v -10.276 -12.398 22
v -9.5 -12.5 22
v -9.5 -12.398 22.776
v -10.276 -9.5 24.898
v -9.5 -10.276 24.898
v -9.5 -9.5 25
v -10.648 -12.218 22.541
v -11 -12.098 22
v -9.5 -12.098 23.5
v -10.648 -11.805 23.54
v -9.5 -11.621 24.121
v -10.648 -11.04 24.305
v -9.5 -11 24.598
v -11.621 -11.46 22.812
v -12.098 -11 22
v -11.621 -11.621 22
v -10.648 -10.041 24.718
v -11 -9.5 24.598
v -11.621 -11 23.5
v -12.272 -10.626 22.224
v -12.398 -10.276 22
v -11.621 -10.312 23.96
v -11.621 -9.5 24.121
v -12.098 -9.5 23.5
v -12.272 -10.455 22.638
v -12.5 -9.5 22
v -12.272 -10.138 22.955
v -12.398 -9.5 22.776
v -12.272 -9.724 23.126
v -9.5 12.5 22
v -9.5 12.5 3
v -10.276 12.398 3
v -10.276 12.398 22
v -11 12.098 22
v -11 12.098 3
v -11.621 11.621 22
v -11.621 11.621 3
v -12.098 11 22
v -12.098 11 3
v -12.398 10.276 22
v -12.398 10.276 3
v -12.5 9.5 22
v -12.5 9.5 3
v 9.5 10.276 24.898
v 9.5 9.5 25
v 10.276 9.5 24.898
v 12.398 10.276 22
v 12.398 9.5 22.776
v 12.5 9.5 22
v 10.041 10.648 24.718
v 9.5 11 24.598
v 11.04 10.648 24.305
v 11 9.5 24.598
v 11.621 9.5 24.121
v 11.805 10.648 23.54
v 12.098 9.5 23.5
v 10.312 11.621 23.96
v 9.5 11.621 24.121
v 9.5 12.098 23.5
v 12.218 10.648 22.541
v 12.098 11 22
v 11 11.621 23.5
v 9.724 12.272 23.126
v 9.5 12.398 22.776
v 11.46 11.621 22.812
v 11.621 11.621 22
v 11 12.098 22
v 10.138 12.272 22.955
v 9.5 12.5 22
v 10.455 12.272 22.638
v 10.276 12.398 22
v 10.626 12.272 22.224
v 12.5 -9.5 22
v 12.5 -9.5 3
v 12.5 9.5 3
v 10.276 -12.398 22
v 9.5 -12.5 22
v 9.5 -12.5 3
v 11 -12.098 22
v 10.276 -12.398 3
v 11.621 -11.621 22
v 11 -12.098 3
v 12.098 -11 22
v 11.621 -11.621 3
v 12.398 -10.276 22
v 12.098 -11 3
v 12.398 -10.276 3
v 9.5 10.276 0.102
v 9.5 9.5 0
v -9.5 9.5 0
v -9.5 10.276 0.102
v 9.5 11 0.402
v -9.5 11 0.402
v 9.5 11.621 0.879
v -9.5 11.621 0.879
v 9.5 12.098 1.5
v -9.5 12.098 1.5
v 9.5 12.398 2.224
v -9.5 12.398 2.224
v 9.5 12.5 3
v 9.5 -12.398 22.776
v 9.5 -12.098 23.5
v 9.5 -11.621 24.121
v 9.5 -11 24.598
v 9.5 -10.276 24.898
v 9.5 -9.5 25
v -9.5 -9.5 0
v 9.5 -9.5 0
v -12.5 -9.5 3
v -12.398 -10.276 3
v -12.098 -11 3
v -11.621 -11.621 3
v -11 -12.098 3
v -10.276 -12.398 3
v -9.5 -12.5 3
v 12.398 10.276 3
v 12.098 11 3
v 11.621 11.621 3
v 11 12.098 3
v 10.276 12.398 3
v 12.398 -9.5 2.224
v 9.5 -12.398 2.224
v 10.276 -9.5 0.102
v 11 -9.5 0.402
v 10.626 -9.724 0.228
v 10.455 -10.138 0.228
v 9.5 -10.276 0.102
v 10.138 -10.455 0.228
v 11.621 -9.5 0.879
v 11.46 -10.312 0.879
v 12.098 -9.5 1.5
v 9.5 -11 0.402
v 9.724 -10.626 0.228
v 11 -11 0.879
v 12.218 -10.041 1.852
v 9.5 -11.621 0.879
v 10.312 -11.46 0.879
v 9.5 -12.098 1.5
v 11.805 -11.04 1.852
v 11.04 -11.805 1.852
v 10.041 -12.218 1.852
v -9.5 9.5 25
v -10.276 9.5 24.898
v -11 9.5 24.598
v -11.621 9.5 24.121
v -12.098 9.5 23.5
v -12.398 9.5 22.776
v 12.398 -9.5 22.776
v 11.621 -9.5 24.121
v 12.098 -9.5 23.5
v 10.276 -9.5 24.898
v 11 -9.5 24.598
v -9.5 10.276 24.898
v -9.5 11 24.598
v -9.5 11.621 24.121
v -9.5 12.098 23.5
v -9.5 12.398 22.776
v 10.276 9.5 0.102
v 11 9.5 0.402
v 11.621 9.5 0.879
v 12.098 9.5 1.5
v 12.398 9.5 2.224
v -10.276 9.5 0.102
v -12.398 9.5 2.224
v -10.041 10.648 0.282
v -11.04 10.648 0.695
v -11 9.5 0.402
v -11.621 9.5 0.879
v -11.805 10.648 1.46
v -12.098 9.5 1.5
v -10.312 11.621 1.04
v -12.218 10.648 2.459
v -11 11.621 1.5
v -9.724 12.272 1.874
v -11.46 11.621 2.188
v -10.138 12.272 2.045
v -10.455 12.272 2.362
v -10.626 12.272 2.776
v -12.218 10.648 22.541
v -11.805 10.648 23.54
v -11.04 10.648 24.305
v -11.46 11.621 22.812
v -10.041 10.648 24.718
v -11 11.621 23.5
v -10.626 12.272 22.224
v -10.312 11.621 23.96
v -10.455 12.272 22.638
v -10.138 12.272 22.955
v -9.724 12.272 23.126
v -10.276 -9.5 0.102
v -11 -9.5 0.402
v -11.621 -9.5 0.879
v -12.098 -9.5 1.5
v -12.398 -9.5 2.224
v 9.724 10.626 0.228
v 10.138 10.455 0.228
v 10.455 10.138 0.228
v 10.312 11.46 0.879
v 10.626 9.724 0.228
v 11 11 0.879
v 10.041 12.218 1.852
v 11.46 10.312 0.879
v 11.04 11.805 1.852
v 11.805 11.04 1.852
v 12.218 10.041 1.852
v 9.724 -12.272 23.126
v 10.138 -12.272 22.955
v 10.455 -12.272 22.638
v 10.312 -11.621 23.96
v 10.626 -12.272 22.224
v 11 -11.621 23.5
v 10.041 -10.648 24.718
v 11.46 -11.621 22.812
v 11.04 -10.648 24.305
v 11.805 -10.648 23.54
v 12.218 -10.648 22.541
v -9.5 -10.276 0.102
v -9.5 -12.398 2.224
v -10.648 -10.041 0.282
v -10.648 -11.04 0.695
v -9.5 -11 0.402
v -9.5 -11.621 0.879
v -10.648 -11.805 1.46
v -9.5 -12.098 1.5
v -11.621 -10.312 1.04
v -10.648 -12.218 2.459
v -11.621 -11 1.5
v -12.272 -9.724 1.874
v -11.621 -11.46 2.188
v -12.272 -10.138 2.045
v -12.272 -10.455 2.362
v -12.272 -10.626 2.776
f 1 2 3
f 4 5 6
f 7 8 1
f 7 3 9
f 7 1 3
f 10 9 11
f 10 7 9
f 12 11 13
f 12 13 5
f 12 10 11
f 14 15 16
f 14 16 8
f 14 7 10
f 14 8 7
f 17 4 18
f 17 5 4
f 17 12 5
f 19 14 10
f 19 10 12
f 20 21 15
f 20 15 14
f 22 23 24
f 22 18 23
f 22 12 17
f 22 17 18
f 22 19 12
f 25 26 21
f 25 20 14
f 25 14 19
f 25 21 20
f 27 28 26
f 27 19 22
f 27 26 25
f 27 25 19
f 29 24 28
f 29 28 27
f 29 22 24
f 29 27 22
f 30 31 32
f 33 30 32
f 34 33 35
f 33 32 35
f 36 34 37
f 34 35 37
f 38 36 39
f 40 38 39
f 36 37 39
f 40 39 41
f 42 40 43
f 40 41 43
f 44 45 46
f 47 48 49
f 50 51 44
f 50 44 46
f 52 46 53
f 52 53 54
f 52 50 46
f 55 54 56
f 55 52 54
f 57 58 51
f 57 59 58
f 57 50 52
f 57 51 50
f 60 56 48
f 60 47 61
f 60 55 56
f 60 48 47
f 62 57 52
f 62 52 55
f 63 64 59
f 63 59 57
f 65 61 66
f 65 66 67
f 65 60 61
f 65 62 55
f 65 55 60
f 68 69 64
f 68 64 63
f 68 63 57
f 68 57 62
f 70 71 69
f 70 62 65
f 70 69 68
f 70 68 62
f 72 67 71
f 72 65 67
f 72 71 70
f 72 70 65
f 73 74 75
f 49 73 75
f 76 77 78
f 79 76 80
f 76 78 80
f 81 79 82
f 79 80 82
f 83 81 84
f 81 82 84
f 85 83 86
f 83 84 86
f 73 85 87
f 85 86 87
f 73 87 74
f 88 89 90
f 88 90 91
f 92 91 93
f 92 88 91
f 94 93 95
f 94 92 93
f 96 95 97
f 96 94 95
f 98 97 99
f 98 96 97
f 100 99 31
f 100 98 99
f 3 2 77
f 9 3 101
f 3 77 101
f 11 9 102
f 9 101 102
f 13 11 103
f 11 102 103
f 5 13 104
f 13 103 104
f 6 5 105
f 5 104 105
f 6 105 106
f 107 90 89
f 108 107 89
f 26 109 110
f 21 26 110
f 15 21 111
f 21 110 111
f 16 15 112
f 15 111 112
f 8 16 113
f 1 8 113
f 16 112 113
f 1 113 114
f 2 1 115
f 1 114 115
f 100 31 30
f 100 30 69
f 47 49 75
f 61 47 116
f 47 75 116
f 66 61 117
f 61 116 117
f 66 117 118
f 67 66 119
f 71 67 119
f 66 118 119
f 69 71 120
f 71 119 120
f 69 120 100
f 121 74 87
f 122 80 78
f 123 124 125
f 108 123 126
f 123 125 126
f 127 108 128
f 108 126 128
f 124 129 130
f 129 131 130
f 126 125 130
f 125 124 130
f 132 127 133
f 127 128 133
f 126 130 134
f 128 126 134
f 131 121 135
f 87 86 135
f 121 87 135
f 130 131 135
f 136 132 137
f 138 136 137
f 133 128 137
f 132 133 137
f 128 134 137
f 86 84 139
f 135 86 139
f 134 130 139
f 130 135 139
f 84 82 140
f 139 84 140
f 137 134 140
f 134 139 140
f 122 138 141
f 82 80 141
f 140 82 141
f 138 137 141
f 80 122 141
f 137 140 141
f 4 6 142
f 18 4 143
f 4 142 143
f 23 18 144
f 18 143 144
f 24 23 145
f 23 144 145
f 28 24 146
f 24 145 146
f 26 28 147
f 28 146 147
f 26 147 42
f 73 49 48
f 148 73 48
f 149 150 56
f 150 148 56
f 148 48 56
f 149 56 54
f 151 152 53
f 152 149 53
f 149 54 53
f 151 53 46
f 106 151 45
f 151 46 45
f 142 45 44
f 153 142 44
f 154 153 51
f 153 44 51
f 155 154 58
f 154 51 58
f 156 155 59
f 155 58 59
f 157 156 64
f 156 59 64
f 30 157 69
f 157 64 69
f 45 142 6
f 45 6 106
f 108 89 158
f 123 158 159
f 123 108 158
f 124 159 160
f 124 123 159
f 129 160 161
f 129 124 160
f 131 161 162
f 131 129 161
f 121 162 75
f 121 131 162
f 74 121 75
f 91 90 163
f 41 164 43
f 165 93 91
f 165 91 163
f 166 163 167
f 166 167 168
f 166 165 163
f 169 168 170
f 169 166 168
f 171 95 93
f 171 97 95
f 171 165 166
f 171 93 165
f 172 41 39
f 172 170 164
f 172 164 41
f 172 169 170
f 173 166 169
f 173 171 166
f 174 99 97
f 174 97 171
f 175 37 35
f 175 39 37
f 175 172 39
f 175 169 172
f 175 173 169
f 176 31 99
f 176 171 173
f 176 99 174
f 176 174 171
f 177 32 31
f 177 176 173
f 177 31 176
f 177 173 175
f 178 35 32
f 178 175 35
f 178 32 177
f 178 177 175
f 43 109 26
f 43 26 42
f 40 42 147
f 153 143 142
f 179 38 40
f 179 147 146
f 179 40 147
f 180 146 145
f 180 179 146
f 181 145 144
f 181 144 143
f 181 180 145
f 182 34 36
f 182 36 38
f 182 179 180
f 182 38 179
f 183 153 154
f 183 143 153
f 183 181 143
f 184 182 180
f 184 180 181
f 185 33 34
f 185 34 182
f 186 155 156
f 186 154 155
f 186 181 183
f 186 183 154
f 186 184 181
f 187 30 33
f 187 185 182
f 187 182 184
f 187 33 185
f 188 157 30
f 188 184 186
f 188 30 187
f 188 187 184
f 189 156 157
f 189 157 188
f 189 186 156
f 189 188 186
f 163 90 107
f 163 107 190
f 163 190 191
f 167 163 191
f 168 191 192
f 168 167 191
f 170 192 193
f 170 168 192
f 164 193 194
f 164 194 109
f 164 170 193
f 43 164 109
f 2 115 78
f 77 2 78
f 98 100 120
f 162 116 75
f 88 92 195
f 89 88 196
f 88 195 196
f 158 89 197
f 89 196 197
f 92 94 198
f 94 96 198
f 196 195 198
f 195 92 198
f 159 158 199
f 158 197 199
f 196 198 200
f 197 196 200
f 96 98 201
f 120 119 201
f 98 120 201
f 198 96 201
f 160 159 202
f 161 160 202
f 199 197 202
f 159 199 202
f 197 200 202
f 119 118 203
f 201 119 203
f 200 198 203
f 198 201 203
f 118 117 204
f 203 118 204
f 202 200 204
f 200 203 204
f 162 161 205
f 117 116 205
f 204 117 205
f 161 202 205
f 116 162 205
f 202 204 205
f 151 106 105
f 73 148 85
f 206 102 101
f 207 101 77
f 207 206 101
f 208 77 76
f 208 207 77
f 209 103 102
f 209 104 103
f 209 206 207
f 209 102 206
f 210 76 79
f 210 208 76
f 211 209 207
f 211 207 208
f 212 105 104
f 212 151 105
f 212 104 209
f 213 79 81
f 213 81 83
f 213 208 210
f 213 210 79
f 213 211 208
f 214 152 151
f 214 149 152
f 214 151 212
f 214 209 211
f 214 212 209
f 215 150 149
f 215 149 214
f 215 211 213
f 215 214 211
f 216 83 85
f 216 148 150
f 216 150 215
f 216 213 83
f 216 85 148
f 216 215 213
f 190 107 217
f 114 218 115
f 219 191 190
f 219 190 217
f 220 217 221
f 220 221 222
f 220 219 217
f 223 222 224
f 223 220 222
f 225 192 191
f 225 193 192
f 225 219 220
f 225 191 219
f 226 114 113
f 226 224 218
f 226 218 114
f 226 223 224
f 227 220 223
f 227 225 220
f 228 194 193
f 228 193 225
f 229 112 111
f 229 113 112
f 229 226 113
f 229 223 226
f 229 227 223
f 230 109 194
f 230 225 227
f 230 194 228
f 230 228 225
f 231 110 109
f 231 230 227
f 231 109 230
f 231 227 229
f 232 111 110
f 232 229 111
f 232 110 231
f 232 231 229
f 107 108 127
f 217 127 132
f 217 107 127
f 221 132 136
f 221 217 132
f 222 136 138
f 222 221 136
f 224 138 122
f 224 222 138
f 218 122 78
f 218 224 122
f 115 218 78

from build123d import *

# Parameters (mm, degrees)
F0_W         = 25
F0_H         = 25
F1_DEPTH     = 25
F2_R         = 3
F3_R         = 3
F4_R         = 3
F5_T1_DEPTH  = 19
F5_S5_W      = 3
F5_S5_H      = 3
F5_T6_DEPTH  = 3
F5_S11_W     = 3
F5_S11_H     = 3
F5_T12_DEPTH = 3
F5_S17_W     = 3
F5_S17_H     = 3
F5_T18_DEPTH = 3
F5_S23_W     = 3
F5_S23_H     = 3
F5_T24_DEPTH = 3


# Not quite as in the source:
# - a fillet or chamfer that OpenCascade refuses, or shapes differently, is made with other operations: its cross-section is extruded or revolved along the edge and cut away or added
# - a feature names something its author has since deleted; it is built from what else it names


with BuildPart() as f1:
    # F0 (on Top) → F1 (new body)
    with BuildSketch(Plane.XY):
        Rectangle(F0_W, F0_H)
    extrude(amount=F1_DEPTH)

    # F2
    f2_edges = [f1.edges().sort_by_distance(p)[0] for p in [
        (12.5, 0, 25),
    ]]
    fillet(f2_edges, radius=F2_R)

    # F3
    f3_edges = [f1.edges().sort_by_distance(p)[0] for p in [
        (-1.5, 12.5, 25),
        (9.5, 0, 25),
        (-12.5, 0, 25),
        (-1.5, -12.5, 25),
    ]]
    fillet(f3_edges, radius=F3_R)

    # F4
    f4_edges = [f1.edges().sort_by_distance(p)[0] for p in [
        (-1.5, 12.5, 0),
        (11.62132, 11.62132, 0),
        (-12.5, 0, 0),
        (12.5, 0, 0),
        (-1.5, -12.5, 0),
        (11.62132, -11.62132, 0),
    ]]
    fillet(f4_edges, radius=F4_R)

    # F5: fillet of radius 3 on 2 edges, made by hand

    # F5_s2 → F5_t1 (cut)
    with BuildSketch(Plane.XY.offset(3)):
        with BuildLine():
            ThreePointArc((-9.5, 12.5), (-11.6213203436, 11.6213203436), (-12.5, 9.5))
            Line((-12.5, 9.5), (-12.5, 12.5))
            Line((-12.5, 12.5), (-9.5, 12.5))
        make_face()
        with BuildLine():
            ThreePointArc((-12.5, -9.5), (-11.6213203436, -11.6213203436), (-9.5, -12.5))
            Line((-9.5, -12.5), (-12.5, -12.5))
            Line((-12.5, -12.5), (-12.5, -9.5))
        make_face()
    extrude(amount=F5_T1_DEPTH, mode=Mode.SUBTRACT)


with BuildPart() as f5_tool4:
    # F5_s5 → F5_t6 (new body)
    with BuildSketch(Plane.YZ.offset(-9.5)):
        with Locations((-11, 1.5)):
            Rectangle(F5_S5_W, F5_S5_H)
    extrude(amount=-F5_T6_DEPTH)

    # F5_s7 → F5_t8 (revolve, cut)
    with BuildSketch(Plane(origin=(-9.5, -9.5, 3), x_dir=(0, 0.7071067812, 0.7071067812), z_dir=(0, -0.7071067812, 0.7071067812))):
        with BuildLine():
            ThreePointArc((0, -3), (3, 0), (0, 3))
            Line((0, 3), (0, -3))
        make_face()
    revolve(axis=Axis((-9.5, -9.5, 3), (-1, 0, 0)), mode=Mode.SUBTRACT)


with BuildPart() as f1_1:
    add(f1.part)

    # F5_t3: cut F5_tool4
    add(f5_tool4.part, mode=Mode.SUBTRACT)


with BuildPart() as f5_tool10:
    # F5_s11 → F5_t12 (new body)
    with BuildSketch(Plane.YZ.offset(-9.5)):
        with Locations((-11, 23.5)):
            Rectangle(F5_S11_W, F5_S11_H)
    extrude(amount=-F5_T12_DEPTH)

    # F5_s13 → F5_t14 (revolve, cut)
    with BuildSketch(Plane(origin=(-9.5, -9.5, 22), x_dir=(0, 0.7071067812, -0.7071067812), z_dir=(0, 0.7071067812, 0.7071067812))):
        with BuildLine():
            ThreePointArc((0, -3), (3, 0), (0, 3))
            Line((0, 3), (0, -3))
        make_face()
    revolve(axis=Axis((-9.5, -9.5, 22), (-1, 0, 0)), mode=Mode.SUBTRACT)


with BuildPart() as f1_2:
    add(f1_1.part)

    # F5_t9: cut F5_tool10
    add(f5_tool10.part, mode=Mode.SUBTRACT)


with BuildPart() as f5_tool16:
    # F5_s17 → F5_t18 (new body)
    with BuildSketch(Plane.XZ.offset(-9.5)):
        with Locations((-11, 1.5)):
            Rectangle(F5_S17_W, F5_S17_H)
    extrude(amount=-F5_T18_DEPTH)

    # F5_s19 → F5_t20 (revolve, cut)
    with BuildSketch(Plane(origin=(-9.5, 9.5, 3), x_dir=(0.7071067812, 0, 0.7071067812), z_dir=(-0.7071067812, 0, 0.7071067812))):
        with BuildLine():
            ThreePointArc((0, -3), (3, 0), (0, 3))
            Line((0, 3), (0, -3))
        make_face()
    revolve(axis=Axis((-9.5, 9.5, 3), (0, 1, 0)), mode=Mode.SUBTRACT)


with BuildPart() as f1_3:
    add(f1_2.part)

    # F5_t15: cut F5_tool16
    add(f5_tool16.part, mode=Mode.SUBTRACT)


with BuildPart() as f5_tool22:
    # F5_s23 → F5_t24 (new body)
    with BuildSketch(Plane.XZ.offset(-9.5)):
        with Locations((-11, 23.5)):
            Rectangle(F5_S23_W, F5_S23_H)
    extrude(amount=-F5_T24_DEPTH)

    # F5_s25 → F5_t26 (revolve, cut)
    with BuildSketch(Plane(origin=(-9.5, 9.5, 22), x_dir=(0.7071067812, 0, -0.7071067812), z_dir=(0.7071067812, 0, 0.7071067812))):
        with BuildLine():
            ThreePointArc((0, -3), (3, 0), (0, 3))
            Line((0, 3), (0, -3))
        make_face()
    revolve(axis=Axis((-9.5, 9.5, 22), (0, 1, 0)), mode=Mode.SUBTRACT)


with BuildPart() as f1_4:
    add(f1_3.part)

    # F5_t21: cut F5_tool22
    add(f5_tool22.part, mode=Mode.SUBTRACT)


solid = f1_4.part
